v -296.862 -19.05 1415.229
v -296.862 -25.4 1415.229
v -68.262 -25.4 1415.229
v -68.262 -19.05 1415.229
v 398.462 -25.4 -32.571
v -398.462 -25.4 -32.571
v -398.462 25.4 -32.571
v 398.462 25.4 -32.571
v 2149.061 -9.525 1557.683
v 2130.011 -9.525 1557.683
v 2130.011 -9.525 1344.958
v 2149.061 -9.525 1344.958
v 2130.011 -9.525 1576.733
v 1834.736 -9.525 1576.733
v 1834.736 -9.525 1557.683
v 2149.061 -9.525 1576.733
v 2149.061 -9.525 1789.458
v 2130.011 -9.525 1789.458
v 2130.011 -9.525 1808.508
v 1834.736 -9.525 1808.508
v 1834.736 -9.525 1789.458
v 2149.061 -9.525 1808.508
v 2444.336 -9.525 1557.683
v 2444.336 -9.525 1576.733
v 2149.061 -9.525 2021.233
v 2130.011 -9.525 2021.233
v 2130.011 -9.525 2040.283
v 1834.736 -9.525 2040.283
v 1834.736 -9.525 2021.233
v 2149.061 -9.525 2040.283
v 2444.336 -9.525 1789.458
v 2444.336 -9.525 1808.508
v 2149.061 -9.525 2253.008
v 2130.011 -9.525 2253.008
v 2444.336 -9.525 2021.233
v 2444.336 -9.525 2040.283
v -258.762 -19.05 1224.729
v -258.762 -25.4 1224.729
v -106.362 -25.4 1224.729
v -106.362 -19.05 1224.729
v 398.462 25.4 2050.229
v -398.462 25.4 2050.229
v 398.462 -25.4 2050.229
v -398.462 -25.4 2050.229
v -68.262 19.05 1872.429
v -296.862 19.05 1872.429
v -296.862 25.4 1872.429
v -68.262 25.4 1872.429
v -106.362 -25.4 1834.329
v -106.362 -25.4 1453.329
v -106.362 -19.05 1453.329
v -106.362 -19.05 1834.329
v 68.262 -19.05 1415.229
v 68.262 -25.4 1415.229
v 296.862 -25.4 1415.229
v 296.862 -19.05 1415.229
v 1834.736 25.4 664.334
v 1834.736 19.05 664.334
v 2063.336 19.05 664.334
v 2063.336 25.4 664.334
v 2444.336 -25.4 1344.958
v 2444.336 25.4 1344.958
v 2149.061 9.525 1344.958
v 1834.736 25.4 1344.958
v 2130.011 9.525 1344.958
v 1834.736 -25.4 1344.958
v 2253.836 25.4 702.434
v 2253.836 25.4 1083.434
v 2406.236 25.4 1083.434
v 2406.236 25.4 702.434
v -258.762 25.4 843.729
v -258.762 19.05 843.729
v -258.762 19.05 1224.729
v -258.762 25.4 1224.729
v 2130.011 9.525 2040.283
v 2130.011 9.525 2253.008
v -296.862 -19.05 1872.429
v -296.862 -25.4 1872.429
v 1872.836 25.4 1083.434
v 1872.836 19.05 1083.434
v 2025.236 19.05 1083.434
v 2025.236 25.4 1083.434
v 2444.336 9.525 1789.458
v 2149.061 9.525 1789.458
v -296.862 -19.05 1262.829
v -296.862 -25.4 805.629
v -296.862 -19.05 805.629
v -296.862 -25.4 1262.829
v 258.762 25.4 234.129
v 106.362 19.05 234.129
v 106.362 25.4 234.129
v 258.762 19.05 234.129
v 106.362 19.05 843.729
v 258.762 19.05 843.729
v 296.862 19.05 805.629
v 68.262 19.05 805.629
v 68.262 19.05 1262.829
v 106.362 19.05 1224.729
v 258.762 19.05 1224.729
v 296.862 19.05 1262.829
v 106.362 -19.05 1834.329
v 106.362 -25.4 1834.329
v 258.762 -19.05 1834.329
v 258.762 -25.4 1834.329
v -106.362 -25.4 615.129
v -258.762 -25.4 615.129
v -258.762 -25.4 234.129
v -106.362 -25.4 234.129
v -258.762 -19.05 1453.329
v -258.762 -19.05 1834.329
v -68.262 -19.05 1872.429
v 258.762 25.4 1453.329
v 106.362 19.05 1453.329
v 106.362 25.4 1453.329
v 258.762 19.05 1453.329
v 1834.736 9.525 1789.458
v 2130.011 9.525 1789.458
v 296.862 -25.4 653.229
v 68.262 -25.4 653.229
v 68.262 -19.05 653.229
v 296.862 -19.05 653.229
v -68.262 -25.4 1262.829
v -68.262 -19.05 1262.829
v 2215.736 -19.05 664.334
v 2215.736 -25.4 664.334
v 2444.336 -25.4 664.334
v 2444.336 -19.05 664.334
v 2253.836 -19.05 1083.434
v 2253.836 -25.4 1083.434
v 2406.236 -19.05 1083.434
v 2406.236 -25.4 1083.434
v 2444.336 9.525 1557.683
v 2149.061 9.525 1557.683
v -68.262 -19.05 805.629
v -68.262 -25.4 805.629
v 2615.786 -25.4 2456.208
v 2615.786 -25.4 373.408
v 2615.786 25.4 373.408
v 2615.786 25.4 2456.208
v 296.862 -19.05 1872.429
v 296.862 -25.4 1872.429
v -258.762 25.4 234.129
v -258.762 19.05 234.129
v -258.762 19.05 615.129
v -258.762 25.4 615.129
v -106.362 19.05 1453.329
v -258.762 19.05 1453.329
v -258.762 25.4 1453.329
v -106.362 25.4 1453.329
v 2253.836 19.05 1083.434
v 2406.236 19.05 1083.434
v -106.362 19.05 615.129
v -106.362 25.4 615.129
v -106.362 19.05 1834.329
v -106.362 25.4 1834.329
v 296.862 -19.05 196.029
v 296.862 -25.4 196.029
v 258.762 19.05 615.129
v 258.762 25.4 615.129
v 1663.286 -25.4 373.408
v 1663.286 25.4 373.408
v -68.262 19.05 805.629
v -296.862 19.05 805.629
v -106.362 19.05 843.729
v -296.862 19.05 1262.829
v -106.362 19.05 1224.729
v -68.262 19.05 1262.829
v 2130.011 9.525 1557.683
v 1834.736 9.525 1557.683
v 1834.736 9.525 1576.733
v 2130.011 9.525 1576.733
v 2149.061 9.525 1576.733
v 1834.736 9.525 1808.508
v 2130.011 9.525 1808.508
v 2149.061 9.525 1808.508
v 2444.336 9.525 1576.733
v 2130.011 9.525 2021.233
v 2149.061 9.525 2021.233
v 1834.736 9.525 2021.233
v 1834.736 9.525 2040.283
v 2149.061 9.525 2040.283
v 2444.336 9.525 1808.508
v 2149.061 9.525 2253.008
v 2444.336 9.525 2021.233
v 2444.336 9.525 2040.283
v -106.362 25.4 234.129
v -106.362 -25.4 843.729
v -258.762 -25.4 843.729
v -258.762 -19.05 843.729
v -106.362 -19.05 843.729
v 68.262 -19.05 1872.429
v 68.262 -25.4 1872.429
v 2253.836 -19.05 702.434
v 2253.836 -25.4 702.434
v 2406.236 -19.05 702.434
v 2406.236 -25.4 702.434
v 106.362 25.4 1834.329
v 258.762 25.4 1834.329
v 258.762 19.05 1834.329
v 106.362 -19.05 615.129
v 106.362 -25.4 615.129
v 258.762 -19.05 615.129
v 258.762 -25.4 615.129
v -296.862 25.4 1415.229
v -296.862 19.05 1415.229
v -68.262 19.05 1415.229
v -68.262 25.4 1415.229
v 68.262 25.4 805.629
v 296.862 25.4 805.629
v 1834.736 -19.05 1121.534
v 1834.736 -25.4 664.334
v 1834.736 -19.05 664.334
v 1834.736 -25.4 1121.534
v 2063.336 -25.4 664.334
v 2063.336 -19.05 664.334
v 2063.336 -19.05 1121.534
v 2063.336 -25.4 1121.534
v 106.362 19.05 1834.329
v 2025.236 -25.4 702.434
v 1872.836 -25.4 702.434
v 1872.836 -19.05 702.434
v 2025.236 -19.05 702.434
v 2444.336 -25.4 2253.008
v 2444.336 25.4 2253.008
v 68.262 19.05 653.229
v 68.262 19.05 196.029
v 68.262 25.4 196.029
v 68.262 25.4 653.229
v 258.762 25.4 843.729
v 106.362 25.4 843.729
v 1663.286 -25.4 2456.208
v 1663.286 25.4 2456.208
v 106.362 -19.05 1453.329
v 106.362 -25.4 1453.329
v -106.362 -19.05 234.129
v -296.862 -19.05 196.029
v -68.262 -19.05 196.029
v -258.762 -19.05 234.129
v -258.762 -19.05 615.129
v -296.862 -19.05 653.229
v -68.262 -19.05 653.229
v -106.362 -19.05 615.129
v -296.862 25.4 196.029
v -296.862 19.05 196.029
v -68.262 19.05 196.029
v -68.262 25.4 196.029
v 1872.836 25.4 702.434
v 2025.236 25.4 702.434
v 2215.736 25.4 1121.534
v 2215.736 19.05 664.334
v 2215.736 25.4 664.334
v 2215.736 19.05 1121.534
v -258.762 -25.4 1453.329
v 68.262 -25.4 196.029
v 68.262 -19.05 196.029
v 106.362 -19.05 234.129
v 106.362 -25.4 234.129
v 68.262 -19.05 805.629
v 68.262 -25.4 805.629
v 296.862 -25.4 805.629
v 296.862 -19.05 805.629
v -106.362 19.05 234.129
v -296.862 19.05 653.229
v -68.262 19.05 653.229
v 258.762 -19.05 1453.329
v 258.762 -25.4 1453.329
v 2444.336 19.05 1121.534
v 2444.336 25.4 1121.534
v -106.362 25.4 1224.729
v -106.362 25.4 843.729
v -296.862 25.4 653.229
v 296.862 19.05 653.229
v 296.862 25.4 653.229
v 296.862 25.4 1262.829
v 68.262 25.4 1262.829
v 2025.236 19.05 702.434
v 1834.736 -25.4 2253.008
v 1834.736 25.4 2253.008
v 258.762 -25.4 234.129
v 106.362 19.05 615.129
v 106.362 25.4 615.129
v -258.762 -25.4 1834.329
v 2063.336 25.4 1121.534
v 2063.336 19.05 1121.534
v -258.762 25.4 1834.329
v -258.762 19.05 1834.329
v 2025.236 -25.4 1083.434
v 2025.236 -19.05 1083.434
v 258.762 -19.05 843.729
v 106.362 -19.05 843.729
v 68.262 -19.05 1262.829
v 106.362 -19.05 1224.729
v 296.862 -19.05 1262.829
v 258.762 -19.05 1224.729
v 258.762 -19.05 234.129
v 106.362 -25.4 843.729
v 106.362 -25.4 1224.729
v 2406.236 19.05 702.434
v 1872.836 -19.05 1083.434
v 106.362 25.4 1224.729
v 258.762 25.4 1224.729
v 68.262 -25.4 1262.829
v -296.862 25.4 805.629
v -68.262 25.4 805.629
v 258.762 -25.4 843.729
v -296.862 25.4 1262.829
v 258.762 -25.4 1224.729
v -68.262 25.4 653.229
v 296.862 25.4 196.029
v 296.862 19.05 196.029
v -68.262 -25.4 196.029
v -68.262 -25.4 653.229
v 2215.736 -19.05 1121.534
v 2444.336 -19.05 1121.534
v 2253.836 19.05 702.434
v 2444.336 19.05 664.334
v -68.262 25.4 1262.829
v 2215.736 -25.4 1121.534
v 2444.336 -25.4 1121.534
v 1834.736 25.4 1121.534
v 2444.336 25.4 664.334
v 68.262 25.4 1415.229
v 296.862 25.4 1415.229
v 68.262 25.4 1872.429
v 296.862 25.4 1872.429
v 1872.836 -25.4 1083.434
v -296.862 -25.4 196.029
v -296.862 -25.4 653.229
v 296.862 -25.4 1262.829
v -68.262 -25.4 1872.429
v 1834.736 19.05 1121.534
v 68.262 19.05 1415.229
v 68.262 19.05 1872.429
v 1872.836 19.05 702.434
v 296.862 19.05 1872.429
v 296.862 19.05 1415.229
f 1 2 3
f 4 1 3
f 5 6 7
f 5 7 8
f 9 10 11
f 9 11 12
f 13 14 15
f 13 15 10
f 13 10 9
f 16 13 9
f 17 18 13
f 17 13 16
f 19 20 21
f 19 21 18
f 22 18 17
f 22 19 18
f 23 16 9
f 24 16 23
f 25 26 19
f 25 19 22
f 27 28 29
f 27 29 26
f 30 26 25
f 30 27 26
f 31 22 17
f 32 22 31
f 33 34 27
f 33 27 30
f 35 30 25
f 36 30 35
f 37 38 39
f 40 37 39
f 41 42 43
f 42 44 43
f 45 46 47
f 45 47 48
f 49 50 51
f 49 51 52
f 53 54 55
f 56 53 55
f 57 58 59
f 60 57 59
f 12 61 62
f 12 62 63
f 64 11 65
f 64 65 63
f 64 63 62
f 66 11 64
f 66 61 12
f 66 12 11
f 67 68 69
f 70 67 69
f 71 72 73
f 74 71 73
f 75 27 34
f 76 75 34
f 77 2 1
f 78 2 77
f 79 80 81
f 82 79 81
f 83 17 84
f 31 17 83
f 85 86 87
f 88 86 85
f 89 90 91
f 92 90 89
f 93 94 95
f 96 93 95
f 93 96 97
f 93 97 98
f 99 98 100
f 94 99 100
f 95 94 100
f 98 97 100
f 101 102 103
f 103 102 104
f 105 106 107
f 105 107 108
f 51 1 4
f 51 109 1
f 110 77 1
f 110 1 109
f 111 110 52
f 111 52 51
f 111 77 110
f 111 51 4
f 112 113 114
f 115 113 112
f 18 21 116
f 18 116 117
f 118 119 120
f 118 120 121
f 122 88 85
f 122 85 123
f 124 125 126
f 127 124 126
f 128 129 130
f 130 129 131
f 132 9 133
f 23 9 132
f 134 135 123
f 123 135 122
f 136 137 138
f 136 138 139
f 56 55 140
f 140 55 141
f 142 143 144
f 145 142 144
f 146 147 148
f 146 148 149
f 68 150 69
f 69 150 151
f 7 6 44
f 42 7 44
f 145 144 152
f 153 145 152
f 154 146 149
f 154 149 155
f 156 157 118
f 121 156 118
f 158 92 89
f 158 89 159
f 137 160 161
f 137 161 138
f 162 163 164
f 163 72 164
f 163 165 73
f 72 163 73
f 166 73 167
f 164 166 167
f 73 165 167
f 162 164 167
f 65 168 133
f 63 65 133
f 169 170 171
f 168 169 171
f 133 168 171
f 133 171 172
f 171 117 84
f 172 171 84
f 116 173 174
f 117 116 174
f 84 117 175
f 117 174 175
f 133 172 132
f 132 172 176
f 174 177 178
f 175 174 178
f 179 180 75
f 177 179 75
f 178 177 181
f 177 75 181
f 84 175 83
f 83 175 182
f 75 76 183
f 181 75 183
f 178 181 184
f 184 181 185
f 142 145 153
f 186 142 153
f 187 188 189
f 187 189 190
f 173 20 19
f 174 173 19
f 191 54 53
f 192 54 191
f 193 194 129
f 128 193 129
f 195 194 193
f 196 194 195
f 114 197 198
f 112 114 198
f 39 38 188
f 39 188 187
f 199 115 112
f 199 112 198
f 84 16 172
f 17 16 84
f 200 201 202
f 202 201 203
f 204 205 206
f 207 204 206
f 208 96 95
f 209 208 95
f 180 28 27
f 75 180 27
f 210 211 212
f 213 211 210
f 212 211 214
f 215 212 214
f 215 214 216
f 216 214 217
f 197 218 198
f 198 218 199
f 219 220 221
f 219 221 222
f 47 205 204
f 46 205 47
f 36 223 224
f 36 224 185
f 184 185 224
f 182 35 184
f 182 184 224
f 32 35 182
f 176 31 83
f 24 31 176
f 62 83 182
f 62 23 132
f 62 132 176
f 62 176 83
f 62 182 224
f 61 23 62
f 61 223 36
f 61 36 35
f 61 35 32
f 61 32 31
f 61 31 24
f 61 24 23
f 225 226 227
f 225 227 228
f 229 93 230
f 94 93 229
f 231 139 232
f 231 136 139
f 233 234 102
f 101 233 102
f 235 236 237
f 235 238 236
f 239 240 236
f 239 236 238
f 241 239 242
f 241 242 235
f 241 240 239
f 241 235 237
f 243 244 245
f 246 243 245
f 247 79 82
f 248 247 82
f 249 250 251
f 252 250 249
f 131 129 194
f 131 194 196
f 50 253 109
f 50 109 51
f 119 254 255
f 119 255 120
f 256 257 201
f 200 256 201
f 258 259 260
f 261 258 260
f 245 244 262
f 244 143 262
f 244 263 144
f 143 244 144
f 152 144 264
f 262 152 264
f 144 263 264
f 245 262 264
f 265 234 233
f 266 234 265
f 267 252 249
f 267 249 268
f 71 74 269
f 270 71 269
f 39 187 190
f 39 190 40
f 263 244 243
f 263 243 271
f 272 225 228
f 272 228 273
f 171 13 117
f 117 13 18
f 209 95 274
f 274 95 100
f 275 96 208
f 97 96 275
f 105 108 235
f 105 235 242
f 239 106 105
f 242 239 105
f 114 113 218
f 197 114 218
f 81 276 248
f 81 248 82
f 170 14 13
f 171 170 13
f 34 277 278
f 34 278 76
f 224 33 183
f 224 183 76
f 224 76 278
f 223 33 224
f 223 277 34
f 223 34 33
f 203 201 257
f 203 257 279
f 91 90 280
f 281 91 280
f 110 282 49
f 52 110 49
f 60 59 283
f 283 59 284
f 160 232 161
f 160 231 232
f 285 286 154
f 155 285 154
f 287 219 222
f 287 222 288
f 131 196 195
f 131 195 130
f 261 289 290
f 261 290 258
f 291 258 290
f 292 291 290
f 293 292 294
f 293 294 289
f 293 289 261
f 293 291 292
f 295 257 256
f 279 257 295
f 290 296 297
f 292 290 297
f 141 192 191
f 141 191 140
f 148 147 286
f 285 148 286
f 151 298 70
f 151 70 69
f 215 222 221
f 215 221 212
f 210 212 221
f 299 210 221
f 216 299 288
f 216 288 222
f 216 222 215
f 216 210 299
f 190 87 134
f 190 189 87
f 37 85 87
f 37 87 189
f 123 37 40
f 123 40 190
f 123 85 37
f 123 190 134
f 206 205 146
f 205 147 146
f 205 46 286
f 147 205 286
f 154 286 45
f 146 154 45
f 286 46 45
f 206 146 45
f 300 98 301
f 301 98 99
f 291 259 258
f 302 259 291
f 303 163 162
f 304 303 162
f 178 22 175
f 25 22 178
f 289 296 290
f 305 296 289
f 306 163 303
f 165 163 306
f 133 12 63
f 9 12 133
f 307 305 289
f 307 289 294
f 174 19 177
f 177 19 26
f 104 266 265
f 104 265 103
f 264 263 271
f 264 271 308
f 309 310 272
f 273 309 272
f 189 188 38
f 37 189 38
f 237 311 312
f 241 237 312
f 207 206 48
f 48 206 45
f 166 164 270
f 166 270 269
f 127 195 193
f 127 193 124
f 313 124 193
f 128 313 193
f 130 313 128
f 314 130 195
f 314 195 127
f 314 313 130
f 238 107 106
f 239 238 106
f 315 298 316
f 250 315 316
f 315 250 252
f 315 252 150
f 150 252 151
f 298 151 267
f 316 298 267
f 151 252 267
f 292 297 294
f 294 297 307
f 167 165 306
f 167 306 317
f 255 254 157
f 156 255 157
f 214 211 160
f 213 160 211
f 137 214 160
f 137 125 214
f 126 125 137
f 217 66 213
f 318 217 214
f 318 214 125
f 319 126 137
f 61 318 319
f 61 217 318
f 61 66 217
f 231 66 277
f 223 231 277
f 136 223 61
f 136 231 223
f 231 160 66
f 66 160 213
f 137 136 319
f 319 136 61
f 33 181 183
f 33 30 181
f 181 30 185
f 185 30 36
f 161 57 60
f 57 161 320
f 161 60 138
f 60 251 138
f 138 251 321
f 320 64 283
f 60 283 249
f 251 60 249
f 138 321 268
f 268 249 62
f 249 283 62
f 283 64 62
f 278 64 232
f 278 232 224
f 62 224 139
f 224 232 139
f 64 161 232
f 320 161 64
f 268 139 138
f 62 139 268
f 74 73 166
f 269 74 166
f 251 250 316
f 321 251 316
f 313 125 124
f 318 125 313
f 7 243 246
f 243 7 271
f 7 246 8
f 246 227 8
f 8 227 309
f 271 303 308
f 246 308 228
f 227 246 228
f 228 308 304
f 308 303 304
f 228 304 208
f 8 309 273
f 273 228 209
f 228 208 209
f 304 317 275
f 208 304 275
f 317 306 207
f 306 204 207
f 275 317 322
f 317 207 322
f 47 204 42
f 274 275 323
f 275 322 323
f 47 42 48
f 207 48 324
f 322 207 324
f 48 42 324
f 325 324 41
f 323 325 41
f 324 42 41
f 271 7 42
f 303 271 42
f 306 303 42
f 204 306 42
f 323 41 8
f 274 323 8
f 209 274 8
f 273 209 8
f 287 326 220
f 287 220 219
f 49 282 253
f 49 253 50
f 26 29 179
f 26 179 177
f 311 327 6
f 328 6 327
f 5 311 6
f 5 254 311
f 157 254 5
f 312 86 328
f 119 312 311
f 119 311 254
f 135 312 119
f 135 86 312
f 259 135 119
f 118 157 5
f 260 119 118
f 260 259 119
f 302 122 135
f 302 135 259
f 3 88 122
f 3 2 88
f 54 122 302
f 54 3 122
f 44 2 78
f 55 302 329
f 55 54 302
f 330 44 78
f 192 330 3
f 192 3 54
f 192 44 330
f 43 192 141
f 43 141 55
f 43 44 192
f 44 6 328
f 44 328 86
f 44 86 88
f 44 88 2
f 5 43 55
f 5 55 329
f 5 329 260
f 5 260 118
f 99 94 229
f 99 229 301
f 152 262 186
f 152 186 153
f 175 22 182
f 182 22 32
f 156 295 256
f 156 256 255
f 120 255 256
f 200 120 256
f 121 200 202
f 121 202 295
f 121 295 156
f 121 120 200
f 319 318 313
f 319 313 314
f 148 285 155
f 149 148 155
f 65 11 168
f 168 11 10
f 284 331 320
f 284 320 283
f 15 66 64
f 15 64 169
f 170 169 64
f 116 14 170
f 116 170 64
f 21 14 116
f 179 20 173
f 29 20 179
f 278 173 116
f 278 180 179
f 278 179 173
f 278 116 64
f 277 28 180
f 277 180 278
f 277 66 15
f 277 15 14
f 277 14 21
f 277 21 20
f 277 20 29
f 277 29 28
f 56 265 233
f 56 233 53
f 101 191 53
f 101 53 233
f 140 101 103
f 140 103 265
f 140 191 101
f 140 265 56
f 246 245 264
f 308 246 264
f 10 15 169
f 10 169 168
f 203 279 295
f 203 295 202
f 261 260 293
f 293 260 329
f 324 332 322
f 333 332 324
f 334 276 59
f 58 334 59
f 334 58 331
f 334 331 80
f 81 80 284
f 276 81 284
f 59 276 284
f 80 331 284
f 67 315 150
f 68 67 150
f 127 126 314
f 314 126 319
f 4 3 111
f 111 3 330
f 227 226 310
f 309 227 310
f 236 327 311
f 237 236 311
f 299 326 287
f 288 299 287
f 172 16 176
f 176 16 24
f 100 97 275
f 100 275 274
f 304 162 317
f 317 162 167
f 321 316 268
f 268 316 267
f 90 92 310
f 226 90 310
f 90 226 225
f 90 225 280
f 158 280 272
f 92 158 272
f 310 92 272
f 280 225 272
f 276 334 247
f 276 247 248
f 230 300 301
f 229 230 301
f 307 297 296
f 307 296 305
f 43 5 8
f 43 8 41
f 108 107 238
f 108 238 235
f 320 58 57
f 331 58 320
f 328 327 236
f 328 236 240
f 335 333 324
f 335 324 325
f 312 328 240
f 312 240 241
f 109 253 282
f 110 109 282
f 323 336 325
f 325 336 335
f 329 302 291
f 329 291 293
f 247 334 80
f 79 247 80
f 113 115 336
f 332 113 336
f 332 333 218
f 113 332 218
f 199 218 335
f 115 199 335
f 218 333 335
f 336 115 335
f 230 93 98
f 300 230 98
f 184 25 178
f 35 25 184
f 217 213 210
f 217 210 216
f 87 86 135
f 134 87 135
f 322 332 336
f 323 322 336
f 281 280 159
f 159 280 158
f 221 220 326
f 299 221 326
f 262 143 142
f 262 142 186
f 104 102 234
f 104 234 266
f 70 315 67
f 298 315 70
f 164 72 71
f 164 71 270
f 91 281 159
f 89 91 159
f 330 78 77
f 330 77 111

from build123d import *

# Parameters (mm, degrees)
F0_W     = 796.925
F0_H     = 2082.8
F0_W_2   = 228.6
F0_H_2   = 457.2
F1_DEPTH = 25.4
F0_W_3   = 152.4
F0_H_3   = 381
F2_DEPTH = 19.05
F3_DEPTH = 25.4
F0_W_4   = 19.05
F0_H_4   = 212.725
F0_W_5   = 295.275
F0_H_5   = 19.05
F4_DEPTH = 9.525
F5_DEPTH = 19.05


with BuildPart() as f1:
    # F0 (on Front) → F1 (new body, symmetric)
    with BuildSketch(Plane.XZ):
        with Locations((0, 1008.8286796093)):
            Rectangle(F0_W, F0_H)
        with Locations((-182.5625, 424.6286796093)):
            Rectangle(F0_W_2, F0_H_2, mode=Mode.SUBTRACT)
        with Locations((182.5625, 424.6286796093)):
            Rectangle(F0_W_2, F0_H_2, mode=Mode.SUBTRACT)
        with Locations((-182.5625, 1034.2286796093)):
            Rectangle(F0_W_2, F0_H_2, mode=Mode.SUBTRACT)
        with Locations((182.5625, 1034.2286796093)):
            Rectangle(F0_W_2, F0_H_2, mode=Mode.SUBTRACT)
        with Locations((-182.5625, 1643.8286796093)):
            Rectangle(F0_W_2, F0_H_2, mode=Mode.SUBTRACT)
        with Locations((182.5625, 1643.8286796093)):
            Rectangle(F0_W_2, F0_H_2, mode=Mode.SUBTRACT)
    extrude(amount=F1_DEPTH, both=True)



with BuildPart() as f1b:
    # F0 (on Front) → F1, piece 2 (new body, symmetric)
    with BuildSketch(Plane.XZ):
        with Locations((-182.5625, 1643.8286796093)):
            Rectangle(F0_W_3, F0_H_3)
    extrude(amount=F1_DEPTH, both=True)


with BuildPart() as f1c:
    # F0 (on Front) → F1, piece 3 (new body, symmetric)
    with BuildSketch(Plane.XZ):
        with Locations((182.5625, 1643.8286796093)):
            Rectangle(F0_W_3, F0_H_3)
    extrude(amount=F1_DEPTH, both=True)


with BuildPart() as f1d:
    # F0 (on Front) → F1, piece 4 (new body, symmetric)
    with BuildSketch(Plane.XZ):
        with Locations((182.5625, 1034.2286796093)):
            Rectangle(F0_W_3, F0_H_3)
    extrude(amount=F1_DEPTH, both=True)


with BuildPart() as f1e:
    # F0 (on Front) → F1, piece 5 (new body, symmetric)
    with BuildSketch(Plane.XZ):
        with Locations((-182.5625, 1034.2286796093)):
            Rectangle(F0_W_3, F0_H_3)
    extrude(amount=F1_DEPTH, both=True)


with BuildPart() as f1f:
    # F0 (on Front) → F1, piece 6 (new body, symmetric)
    with BuildSketch(Plane.XZ):
        with Locations((-182.5625, 424.6286796093)):
            Rectangle(F0_W_3, F0_H_3)
    extrude(amount=F1_DEPTH, both=True)


with BuildPart() as f1g:
    # F0 (on Front) → F1, piece 7 (new body, symmetric)
    with BuildSketch(Plane.XZ):
        with Locations((182.5625, 424.6286796093)):
            Rectangle(F0_W_3, F0_H_3)
    extrude(amount=F1_DEPTH, both=True)


with BuildPart() as f1_1:
    add(f1.part)

    add(f1b.part)  # F2 merges F1b

    add(f1c.part)  # F2 merges F1c

    add(f1d.part)  # F2 merges F1d

    add(f1e.part)  # F2 merges F1e

    add(f1f.part)  # F2 merges F1f

    add(f1g.part)  # F2 merges F1g
    # F0 (on Front) → F2 (join, symmetric)
    with BuildSketch(Plane.XZ):
        with Locations((-182.5625, 1643.8286796093)):
            Rectangle(F0_W_2, F0_H_2)
        with Locations((-182.5625, 1643.8286796093)):
            Rectangle(F0_W_3, F0_H_3, mode=Mode.SUBTRACT)
        with Locations((182.5625, 1643.8286796093)):
            Rectangle(F0_W_2, F0_H_2)
        with Locations((182.5625, 1643.8286796093)):
            Rectangle(F0_W_3, F0_H_3, mode=Mode.SUBTRACT)
        with Locations((182.5625, 1034.2286796093)):
            Rectangle(F0_W_2, F0_H_2)
        with Locations((182.5625, 1034.2286796093)):
            Rectangle(F0_W_3, F0_H_3, mode=Mode.SUBTRACT)
        with Locations((-182.5625, 1034.2286796093)):
            Rectangle(F0_W_2, F0_H_2)
        with Locations((-182.5625, 1034.2286796093)):
            Rectangle(F0_W_3, F0_H_3, mode=Mode.SUBTRACT)
        with Locations((-182.5625, 424.6286796093)):
            Rectangle(F0_W_2, F0_H_2)
        with Locations((-182.5625, 424.6286796093)):
            Rectangle(F0_W_3, F0_H_3, mode=Mode.SUBTRACT)
        with Locations((182.5625, 424.6286796093)):
            Rectangle(F0_W_2, F0_H_2)
        with Locations((182.5625, 424.6286796093)):
            Rectangle(F0_W_3, F0_H_3, mode=Mode.SUBTRACT)
    extrude(amount=F2_DEPTH, both=True)


with BuildPart() as f3:
    # F0 (on Front) → F3 (new body, symmetric)
    with BuildSketch(Plane.XZ):
        Polygon((2139.5355490623, 2456.2077066942), (1663.2855490623, 2456.2077066942), (1663.2855490623, 373.4077066942), (2139.5355490623, 373.4077066942), (2615.7855490623, 373.4077066942), (2615.7855490623, 2456.2077066942), align=None)
        with Locations((1949.0355490623, 892.9336071014)):
            Rectangle(F0_W_2, F0_H_2, mode=Mode.SUBTRACT)
        with Locations((2330.0355490623, 892.9336071014)):
            Rectangle(F0_W_2, F0_H_2, mode=Mode.SUBTRACT)
        Polygon((1834.7355490623, 2040.2827066942), (1834.7355490623, 2253.0077066942), (2130.0105490623, 2253.0077066942), (2149.0605490623, 2253.0077066942), (2444.3355490623, 2253.0077066942), (2444.3355490623, 2040.2827066942), (2444.3355490623, 2021.2327066942), (2444.3355490623, 1808.5077066942), (2444.3355490623, 1789.4577066942), (2444.3355490623, 1576.7327066942), (2444.3355490623, 1557.6827066942), (2444.3355490623, 1344.9577066942), (2149.0605490623, 1344.9577066942), (2130.0105490623, 1344.9577066942), (1834.7355490623, 1344.9577066942), (1834.7355490623, 1557.6827066942), (1834.7355490623, 1576.7327066942), (1834.7355490623, 1789.4577066942), (1834.7355490623, 1808.5077066942), (1834.7355490623, 2021.2327066942), align=None, mode=Mode.SUBTRACT)
    extrude(amount=F3_DEPTH, both=True)

    # F0 (on Front) → F4 (join, symmetric)
    with BuildSketch(Plane.XZ):
        with Locations((2139.5355490623, 2146.6452066942)):
            Rectangle(F0_W_4, F0_H_4)
        with Locations((1982.3730490623, 2030.7577066942)):
            Rectangle(F0_W_5, F0_H_5)
        with Locations((2296.6980490623, 2030.7577066942)):
            Rectangle(F0_W_5, F0_H_5)
        with Locations((2139.5355490623, 1914.8702066942)):
            Rectangle(F0_W_4, F0_H_4)
        with Locations((1982.3730490623, 1798.9827066942)):
            Rectangle(F0_W_5, F0_H_5)
        with Locations((2296.6980490623, 1798.9827066942)):
            Rectangle(F0_W_5, F0_H_5)
        with Locations((2139.5355490623, 1683.0952066942)):
            Rectangle(F0_W_4, F0_H_4)
        with Locations((2139.5355490623, 1451.3202066942)):
            Rectangle(F0_W_4, F0_H_4)
        with Locations((2296.6980490623, 1567.2077066942)):
            Rectangle(F0_W_5, F0_H_5)
        with Locations((1982.3730490623, 1567.2077066942)):
            Rectangle(F0_W_5, F0_H_5)
        with Locations((2139.5355490623, 1567.2077066942)):
            Rectangle(F0_W_4, F0_H_5)
        with Locations((2139.5355490623, 1798.9827066942)):
            Rectangle(F0_W_4, F0_H_5)
        with Locations((2139.5355490623, 2030.7577066942)):
            Rectangle(F0_W_4, F0_H_5)
    extrude(amount=F4_DEPTH, both=True)



with BuildPart() as f3b:
    # F0 (on Front) → F3, piece 2 (new body, symmetric)
    with BuildSketch(Plane.XZ):
        with Locations((1949.0355490623, 892.9336071014)):
            Rectangle(F0_W_3, F0_H_3)
    extrude(amount=F3_DEPTH, both=True)


with BuildPart() as f3c:
    # F0 (on Front) → F3, piece 3 (new body, symmetric)
    with BuildSketch(Plane.XZ):
        with Locations((2330.0355490623, 892.9336071014)):
            Rectangle(F0_W_3, F0_H_3)
    extrude(amount=F3_DEPTH, both=True)


with BuildPart() as f3_1:
    add(f3.part)

    add(f3b.part)  # F5 merges F3b

    add(f3c.part)  # F5 merges F3c
    # F0 (on Front) → F5 (join, symmetric)
    with BuildSketch(Plane.XZ):
        with Locations((1949.0355490623, 892.9336071014)):
            Rectangle(F0_W_2, F0_H_2)
        with Locations((1949.0355490623, 892.9336071014)):
            Rectangle(F0_W_3, F0_H_3, mode=Mode.SUBTRACT)
        with Locations((2330.0355490623, 892.9336071014)):
            Rectangle(F0_W_2, F0_H_2)
        with Locations((2330.0355490623, 892.9336071014)):
            Rectangle(F0_W_3, F0_H_3, mode=Mode.SUBTRACT)
    extrude(amount=F5_DEPTH, both=True)


solid = Compound([f1_1.part, f3_1.part])
